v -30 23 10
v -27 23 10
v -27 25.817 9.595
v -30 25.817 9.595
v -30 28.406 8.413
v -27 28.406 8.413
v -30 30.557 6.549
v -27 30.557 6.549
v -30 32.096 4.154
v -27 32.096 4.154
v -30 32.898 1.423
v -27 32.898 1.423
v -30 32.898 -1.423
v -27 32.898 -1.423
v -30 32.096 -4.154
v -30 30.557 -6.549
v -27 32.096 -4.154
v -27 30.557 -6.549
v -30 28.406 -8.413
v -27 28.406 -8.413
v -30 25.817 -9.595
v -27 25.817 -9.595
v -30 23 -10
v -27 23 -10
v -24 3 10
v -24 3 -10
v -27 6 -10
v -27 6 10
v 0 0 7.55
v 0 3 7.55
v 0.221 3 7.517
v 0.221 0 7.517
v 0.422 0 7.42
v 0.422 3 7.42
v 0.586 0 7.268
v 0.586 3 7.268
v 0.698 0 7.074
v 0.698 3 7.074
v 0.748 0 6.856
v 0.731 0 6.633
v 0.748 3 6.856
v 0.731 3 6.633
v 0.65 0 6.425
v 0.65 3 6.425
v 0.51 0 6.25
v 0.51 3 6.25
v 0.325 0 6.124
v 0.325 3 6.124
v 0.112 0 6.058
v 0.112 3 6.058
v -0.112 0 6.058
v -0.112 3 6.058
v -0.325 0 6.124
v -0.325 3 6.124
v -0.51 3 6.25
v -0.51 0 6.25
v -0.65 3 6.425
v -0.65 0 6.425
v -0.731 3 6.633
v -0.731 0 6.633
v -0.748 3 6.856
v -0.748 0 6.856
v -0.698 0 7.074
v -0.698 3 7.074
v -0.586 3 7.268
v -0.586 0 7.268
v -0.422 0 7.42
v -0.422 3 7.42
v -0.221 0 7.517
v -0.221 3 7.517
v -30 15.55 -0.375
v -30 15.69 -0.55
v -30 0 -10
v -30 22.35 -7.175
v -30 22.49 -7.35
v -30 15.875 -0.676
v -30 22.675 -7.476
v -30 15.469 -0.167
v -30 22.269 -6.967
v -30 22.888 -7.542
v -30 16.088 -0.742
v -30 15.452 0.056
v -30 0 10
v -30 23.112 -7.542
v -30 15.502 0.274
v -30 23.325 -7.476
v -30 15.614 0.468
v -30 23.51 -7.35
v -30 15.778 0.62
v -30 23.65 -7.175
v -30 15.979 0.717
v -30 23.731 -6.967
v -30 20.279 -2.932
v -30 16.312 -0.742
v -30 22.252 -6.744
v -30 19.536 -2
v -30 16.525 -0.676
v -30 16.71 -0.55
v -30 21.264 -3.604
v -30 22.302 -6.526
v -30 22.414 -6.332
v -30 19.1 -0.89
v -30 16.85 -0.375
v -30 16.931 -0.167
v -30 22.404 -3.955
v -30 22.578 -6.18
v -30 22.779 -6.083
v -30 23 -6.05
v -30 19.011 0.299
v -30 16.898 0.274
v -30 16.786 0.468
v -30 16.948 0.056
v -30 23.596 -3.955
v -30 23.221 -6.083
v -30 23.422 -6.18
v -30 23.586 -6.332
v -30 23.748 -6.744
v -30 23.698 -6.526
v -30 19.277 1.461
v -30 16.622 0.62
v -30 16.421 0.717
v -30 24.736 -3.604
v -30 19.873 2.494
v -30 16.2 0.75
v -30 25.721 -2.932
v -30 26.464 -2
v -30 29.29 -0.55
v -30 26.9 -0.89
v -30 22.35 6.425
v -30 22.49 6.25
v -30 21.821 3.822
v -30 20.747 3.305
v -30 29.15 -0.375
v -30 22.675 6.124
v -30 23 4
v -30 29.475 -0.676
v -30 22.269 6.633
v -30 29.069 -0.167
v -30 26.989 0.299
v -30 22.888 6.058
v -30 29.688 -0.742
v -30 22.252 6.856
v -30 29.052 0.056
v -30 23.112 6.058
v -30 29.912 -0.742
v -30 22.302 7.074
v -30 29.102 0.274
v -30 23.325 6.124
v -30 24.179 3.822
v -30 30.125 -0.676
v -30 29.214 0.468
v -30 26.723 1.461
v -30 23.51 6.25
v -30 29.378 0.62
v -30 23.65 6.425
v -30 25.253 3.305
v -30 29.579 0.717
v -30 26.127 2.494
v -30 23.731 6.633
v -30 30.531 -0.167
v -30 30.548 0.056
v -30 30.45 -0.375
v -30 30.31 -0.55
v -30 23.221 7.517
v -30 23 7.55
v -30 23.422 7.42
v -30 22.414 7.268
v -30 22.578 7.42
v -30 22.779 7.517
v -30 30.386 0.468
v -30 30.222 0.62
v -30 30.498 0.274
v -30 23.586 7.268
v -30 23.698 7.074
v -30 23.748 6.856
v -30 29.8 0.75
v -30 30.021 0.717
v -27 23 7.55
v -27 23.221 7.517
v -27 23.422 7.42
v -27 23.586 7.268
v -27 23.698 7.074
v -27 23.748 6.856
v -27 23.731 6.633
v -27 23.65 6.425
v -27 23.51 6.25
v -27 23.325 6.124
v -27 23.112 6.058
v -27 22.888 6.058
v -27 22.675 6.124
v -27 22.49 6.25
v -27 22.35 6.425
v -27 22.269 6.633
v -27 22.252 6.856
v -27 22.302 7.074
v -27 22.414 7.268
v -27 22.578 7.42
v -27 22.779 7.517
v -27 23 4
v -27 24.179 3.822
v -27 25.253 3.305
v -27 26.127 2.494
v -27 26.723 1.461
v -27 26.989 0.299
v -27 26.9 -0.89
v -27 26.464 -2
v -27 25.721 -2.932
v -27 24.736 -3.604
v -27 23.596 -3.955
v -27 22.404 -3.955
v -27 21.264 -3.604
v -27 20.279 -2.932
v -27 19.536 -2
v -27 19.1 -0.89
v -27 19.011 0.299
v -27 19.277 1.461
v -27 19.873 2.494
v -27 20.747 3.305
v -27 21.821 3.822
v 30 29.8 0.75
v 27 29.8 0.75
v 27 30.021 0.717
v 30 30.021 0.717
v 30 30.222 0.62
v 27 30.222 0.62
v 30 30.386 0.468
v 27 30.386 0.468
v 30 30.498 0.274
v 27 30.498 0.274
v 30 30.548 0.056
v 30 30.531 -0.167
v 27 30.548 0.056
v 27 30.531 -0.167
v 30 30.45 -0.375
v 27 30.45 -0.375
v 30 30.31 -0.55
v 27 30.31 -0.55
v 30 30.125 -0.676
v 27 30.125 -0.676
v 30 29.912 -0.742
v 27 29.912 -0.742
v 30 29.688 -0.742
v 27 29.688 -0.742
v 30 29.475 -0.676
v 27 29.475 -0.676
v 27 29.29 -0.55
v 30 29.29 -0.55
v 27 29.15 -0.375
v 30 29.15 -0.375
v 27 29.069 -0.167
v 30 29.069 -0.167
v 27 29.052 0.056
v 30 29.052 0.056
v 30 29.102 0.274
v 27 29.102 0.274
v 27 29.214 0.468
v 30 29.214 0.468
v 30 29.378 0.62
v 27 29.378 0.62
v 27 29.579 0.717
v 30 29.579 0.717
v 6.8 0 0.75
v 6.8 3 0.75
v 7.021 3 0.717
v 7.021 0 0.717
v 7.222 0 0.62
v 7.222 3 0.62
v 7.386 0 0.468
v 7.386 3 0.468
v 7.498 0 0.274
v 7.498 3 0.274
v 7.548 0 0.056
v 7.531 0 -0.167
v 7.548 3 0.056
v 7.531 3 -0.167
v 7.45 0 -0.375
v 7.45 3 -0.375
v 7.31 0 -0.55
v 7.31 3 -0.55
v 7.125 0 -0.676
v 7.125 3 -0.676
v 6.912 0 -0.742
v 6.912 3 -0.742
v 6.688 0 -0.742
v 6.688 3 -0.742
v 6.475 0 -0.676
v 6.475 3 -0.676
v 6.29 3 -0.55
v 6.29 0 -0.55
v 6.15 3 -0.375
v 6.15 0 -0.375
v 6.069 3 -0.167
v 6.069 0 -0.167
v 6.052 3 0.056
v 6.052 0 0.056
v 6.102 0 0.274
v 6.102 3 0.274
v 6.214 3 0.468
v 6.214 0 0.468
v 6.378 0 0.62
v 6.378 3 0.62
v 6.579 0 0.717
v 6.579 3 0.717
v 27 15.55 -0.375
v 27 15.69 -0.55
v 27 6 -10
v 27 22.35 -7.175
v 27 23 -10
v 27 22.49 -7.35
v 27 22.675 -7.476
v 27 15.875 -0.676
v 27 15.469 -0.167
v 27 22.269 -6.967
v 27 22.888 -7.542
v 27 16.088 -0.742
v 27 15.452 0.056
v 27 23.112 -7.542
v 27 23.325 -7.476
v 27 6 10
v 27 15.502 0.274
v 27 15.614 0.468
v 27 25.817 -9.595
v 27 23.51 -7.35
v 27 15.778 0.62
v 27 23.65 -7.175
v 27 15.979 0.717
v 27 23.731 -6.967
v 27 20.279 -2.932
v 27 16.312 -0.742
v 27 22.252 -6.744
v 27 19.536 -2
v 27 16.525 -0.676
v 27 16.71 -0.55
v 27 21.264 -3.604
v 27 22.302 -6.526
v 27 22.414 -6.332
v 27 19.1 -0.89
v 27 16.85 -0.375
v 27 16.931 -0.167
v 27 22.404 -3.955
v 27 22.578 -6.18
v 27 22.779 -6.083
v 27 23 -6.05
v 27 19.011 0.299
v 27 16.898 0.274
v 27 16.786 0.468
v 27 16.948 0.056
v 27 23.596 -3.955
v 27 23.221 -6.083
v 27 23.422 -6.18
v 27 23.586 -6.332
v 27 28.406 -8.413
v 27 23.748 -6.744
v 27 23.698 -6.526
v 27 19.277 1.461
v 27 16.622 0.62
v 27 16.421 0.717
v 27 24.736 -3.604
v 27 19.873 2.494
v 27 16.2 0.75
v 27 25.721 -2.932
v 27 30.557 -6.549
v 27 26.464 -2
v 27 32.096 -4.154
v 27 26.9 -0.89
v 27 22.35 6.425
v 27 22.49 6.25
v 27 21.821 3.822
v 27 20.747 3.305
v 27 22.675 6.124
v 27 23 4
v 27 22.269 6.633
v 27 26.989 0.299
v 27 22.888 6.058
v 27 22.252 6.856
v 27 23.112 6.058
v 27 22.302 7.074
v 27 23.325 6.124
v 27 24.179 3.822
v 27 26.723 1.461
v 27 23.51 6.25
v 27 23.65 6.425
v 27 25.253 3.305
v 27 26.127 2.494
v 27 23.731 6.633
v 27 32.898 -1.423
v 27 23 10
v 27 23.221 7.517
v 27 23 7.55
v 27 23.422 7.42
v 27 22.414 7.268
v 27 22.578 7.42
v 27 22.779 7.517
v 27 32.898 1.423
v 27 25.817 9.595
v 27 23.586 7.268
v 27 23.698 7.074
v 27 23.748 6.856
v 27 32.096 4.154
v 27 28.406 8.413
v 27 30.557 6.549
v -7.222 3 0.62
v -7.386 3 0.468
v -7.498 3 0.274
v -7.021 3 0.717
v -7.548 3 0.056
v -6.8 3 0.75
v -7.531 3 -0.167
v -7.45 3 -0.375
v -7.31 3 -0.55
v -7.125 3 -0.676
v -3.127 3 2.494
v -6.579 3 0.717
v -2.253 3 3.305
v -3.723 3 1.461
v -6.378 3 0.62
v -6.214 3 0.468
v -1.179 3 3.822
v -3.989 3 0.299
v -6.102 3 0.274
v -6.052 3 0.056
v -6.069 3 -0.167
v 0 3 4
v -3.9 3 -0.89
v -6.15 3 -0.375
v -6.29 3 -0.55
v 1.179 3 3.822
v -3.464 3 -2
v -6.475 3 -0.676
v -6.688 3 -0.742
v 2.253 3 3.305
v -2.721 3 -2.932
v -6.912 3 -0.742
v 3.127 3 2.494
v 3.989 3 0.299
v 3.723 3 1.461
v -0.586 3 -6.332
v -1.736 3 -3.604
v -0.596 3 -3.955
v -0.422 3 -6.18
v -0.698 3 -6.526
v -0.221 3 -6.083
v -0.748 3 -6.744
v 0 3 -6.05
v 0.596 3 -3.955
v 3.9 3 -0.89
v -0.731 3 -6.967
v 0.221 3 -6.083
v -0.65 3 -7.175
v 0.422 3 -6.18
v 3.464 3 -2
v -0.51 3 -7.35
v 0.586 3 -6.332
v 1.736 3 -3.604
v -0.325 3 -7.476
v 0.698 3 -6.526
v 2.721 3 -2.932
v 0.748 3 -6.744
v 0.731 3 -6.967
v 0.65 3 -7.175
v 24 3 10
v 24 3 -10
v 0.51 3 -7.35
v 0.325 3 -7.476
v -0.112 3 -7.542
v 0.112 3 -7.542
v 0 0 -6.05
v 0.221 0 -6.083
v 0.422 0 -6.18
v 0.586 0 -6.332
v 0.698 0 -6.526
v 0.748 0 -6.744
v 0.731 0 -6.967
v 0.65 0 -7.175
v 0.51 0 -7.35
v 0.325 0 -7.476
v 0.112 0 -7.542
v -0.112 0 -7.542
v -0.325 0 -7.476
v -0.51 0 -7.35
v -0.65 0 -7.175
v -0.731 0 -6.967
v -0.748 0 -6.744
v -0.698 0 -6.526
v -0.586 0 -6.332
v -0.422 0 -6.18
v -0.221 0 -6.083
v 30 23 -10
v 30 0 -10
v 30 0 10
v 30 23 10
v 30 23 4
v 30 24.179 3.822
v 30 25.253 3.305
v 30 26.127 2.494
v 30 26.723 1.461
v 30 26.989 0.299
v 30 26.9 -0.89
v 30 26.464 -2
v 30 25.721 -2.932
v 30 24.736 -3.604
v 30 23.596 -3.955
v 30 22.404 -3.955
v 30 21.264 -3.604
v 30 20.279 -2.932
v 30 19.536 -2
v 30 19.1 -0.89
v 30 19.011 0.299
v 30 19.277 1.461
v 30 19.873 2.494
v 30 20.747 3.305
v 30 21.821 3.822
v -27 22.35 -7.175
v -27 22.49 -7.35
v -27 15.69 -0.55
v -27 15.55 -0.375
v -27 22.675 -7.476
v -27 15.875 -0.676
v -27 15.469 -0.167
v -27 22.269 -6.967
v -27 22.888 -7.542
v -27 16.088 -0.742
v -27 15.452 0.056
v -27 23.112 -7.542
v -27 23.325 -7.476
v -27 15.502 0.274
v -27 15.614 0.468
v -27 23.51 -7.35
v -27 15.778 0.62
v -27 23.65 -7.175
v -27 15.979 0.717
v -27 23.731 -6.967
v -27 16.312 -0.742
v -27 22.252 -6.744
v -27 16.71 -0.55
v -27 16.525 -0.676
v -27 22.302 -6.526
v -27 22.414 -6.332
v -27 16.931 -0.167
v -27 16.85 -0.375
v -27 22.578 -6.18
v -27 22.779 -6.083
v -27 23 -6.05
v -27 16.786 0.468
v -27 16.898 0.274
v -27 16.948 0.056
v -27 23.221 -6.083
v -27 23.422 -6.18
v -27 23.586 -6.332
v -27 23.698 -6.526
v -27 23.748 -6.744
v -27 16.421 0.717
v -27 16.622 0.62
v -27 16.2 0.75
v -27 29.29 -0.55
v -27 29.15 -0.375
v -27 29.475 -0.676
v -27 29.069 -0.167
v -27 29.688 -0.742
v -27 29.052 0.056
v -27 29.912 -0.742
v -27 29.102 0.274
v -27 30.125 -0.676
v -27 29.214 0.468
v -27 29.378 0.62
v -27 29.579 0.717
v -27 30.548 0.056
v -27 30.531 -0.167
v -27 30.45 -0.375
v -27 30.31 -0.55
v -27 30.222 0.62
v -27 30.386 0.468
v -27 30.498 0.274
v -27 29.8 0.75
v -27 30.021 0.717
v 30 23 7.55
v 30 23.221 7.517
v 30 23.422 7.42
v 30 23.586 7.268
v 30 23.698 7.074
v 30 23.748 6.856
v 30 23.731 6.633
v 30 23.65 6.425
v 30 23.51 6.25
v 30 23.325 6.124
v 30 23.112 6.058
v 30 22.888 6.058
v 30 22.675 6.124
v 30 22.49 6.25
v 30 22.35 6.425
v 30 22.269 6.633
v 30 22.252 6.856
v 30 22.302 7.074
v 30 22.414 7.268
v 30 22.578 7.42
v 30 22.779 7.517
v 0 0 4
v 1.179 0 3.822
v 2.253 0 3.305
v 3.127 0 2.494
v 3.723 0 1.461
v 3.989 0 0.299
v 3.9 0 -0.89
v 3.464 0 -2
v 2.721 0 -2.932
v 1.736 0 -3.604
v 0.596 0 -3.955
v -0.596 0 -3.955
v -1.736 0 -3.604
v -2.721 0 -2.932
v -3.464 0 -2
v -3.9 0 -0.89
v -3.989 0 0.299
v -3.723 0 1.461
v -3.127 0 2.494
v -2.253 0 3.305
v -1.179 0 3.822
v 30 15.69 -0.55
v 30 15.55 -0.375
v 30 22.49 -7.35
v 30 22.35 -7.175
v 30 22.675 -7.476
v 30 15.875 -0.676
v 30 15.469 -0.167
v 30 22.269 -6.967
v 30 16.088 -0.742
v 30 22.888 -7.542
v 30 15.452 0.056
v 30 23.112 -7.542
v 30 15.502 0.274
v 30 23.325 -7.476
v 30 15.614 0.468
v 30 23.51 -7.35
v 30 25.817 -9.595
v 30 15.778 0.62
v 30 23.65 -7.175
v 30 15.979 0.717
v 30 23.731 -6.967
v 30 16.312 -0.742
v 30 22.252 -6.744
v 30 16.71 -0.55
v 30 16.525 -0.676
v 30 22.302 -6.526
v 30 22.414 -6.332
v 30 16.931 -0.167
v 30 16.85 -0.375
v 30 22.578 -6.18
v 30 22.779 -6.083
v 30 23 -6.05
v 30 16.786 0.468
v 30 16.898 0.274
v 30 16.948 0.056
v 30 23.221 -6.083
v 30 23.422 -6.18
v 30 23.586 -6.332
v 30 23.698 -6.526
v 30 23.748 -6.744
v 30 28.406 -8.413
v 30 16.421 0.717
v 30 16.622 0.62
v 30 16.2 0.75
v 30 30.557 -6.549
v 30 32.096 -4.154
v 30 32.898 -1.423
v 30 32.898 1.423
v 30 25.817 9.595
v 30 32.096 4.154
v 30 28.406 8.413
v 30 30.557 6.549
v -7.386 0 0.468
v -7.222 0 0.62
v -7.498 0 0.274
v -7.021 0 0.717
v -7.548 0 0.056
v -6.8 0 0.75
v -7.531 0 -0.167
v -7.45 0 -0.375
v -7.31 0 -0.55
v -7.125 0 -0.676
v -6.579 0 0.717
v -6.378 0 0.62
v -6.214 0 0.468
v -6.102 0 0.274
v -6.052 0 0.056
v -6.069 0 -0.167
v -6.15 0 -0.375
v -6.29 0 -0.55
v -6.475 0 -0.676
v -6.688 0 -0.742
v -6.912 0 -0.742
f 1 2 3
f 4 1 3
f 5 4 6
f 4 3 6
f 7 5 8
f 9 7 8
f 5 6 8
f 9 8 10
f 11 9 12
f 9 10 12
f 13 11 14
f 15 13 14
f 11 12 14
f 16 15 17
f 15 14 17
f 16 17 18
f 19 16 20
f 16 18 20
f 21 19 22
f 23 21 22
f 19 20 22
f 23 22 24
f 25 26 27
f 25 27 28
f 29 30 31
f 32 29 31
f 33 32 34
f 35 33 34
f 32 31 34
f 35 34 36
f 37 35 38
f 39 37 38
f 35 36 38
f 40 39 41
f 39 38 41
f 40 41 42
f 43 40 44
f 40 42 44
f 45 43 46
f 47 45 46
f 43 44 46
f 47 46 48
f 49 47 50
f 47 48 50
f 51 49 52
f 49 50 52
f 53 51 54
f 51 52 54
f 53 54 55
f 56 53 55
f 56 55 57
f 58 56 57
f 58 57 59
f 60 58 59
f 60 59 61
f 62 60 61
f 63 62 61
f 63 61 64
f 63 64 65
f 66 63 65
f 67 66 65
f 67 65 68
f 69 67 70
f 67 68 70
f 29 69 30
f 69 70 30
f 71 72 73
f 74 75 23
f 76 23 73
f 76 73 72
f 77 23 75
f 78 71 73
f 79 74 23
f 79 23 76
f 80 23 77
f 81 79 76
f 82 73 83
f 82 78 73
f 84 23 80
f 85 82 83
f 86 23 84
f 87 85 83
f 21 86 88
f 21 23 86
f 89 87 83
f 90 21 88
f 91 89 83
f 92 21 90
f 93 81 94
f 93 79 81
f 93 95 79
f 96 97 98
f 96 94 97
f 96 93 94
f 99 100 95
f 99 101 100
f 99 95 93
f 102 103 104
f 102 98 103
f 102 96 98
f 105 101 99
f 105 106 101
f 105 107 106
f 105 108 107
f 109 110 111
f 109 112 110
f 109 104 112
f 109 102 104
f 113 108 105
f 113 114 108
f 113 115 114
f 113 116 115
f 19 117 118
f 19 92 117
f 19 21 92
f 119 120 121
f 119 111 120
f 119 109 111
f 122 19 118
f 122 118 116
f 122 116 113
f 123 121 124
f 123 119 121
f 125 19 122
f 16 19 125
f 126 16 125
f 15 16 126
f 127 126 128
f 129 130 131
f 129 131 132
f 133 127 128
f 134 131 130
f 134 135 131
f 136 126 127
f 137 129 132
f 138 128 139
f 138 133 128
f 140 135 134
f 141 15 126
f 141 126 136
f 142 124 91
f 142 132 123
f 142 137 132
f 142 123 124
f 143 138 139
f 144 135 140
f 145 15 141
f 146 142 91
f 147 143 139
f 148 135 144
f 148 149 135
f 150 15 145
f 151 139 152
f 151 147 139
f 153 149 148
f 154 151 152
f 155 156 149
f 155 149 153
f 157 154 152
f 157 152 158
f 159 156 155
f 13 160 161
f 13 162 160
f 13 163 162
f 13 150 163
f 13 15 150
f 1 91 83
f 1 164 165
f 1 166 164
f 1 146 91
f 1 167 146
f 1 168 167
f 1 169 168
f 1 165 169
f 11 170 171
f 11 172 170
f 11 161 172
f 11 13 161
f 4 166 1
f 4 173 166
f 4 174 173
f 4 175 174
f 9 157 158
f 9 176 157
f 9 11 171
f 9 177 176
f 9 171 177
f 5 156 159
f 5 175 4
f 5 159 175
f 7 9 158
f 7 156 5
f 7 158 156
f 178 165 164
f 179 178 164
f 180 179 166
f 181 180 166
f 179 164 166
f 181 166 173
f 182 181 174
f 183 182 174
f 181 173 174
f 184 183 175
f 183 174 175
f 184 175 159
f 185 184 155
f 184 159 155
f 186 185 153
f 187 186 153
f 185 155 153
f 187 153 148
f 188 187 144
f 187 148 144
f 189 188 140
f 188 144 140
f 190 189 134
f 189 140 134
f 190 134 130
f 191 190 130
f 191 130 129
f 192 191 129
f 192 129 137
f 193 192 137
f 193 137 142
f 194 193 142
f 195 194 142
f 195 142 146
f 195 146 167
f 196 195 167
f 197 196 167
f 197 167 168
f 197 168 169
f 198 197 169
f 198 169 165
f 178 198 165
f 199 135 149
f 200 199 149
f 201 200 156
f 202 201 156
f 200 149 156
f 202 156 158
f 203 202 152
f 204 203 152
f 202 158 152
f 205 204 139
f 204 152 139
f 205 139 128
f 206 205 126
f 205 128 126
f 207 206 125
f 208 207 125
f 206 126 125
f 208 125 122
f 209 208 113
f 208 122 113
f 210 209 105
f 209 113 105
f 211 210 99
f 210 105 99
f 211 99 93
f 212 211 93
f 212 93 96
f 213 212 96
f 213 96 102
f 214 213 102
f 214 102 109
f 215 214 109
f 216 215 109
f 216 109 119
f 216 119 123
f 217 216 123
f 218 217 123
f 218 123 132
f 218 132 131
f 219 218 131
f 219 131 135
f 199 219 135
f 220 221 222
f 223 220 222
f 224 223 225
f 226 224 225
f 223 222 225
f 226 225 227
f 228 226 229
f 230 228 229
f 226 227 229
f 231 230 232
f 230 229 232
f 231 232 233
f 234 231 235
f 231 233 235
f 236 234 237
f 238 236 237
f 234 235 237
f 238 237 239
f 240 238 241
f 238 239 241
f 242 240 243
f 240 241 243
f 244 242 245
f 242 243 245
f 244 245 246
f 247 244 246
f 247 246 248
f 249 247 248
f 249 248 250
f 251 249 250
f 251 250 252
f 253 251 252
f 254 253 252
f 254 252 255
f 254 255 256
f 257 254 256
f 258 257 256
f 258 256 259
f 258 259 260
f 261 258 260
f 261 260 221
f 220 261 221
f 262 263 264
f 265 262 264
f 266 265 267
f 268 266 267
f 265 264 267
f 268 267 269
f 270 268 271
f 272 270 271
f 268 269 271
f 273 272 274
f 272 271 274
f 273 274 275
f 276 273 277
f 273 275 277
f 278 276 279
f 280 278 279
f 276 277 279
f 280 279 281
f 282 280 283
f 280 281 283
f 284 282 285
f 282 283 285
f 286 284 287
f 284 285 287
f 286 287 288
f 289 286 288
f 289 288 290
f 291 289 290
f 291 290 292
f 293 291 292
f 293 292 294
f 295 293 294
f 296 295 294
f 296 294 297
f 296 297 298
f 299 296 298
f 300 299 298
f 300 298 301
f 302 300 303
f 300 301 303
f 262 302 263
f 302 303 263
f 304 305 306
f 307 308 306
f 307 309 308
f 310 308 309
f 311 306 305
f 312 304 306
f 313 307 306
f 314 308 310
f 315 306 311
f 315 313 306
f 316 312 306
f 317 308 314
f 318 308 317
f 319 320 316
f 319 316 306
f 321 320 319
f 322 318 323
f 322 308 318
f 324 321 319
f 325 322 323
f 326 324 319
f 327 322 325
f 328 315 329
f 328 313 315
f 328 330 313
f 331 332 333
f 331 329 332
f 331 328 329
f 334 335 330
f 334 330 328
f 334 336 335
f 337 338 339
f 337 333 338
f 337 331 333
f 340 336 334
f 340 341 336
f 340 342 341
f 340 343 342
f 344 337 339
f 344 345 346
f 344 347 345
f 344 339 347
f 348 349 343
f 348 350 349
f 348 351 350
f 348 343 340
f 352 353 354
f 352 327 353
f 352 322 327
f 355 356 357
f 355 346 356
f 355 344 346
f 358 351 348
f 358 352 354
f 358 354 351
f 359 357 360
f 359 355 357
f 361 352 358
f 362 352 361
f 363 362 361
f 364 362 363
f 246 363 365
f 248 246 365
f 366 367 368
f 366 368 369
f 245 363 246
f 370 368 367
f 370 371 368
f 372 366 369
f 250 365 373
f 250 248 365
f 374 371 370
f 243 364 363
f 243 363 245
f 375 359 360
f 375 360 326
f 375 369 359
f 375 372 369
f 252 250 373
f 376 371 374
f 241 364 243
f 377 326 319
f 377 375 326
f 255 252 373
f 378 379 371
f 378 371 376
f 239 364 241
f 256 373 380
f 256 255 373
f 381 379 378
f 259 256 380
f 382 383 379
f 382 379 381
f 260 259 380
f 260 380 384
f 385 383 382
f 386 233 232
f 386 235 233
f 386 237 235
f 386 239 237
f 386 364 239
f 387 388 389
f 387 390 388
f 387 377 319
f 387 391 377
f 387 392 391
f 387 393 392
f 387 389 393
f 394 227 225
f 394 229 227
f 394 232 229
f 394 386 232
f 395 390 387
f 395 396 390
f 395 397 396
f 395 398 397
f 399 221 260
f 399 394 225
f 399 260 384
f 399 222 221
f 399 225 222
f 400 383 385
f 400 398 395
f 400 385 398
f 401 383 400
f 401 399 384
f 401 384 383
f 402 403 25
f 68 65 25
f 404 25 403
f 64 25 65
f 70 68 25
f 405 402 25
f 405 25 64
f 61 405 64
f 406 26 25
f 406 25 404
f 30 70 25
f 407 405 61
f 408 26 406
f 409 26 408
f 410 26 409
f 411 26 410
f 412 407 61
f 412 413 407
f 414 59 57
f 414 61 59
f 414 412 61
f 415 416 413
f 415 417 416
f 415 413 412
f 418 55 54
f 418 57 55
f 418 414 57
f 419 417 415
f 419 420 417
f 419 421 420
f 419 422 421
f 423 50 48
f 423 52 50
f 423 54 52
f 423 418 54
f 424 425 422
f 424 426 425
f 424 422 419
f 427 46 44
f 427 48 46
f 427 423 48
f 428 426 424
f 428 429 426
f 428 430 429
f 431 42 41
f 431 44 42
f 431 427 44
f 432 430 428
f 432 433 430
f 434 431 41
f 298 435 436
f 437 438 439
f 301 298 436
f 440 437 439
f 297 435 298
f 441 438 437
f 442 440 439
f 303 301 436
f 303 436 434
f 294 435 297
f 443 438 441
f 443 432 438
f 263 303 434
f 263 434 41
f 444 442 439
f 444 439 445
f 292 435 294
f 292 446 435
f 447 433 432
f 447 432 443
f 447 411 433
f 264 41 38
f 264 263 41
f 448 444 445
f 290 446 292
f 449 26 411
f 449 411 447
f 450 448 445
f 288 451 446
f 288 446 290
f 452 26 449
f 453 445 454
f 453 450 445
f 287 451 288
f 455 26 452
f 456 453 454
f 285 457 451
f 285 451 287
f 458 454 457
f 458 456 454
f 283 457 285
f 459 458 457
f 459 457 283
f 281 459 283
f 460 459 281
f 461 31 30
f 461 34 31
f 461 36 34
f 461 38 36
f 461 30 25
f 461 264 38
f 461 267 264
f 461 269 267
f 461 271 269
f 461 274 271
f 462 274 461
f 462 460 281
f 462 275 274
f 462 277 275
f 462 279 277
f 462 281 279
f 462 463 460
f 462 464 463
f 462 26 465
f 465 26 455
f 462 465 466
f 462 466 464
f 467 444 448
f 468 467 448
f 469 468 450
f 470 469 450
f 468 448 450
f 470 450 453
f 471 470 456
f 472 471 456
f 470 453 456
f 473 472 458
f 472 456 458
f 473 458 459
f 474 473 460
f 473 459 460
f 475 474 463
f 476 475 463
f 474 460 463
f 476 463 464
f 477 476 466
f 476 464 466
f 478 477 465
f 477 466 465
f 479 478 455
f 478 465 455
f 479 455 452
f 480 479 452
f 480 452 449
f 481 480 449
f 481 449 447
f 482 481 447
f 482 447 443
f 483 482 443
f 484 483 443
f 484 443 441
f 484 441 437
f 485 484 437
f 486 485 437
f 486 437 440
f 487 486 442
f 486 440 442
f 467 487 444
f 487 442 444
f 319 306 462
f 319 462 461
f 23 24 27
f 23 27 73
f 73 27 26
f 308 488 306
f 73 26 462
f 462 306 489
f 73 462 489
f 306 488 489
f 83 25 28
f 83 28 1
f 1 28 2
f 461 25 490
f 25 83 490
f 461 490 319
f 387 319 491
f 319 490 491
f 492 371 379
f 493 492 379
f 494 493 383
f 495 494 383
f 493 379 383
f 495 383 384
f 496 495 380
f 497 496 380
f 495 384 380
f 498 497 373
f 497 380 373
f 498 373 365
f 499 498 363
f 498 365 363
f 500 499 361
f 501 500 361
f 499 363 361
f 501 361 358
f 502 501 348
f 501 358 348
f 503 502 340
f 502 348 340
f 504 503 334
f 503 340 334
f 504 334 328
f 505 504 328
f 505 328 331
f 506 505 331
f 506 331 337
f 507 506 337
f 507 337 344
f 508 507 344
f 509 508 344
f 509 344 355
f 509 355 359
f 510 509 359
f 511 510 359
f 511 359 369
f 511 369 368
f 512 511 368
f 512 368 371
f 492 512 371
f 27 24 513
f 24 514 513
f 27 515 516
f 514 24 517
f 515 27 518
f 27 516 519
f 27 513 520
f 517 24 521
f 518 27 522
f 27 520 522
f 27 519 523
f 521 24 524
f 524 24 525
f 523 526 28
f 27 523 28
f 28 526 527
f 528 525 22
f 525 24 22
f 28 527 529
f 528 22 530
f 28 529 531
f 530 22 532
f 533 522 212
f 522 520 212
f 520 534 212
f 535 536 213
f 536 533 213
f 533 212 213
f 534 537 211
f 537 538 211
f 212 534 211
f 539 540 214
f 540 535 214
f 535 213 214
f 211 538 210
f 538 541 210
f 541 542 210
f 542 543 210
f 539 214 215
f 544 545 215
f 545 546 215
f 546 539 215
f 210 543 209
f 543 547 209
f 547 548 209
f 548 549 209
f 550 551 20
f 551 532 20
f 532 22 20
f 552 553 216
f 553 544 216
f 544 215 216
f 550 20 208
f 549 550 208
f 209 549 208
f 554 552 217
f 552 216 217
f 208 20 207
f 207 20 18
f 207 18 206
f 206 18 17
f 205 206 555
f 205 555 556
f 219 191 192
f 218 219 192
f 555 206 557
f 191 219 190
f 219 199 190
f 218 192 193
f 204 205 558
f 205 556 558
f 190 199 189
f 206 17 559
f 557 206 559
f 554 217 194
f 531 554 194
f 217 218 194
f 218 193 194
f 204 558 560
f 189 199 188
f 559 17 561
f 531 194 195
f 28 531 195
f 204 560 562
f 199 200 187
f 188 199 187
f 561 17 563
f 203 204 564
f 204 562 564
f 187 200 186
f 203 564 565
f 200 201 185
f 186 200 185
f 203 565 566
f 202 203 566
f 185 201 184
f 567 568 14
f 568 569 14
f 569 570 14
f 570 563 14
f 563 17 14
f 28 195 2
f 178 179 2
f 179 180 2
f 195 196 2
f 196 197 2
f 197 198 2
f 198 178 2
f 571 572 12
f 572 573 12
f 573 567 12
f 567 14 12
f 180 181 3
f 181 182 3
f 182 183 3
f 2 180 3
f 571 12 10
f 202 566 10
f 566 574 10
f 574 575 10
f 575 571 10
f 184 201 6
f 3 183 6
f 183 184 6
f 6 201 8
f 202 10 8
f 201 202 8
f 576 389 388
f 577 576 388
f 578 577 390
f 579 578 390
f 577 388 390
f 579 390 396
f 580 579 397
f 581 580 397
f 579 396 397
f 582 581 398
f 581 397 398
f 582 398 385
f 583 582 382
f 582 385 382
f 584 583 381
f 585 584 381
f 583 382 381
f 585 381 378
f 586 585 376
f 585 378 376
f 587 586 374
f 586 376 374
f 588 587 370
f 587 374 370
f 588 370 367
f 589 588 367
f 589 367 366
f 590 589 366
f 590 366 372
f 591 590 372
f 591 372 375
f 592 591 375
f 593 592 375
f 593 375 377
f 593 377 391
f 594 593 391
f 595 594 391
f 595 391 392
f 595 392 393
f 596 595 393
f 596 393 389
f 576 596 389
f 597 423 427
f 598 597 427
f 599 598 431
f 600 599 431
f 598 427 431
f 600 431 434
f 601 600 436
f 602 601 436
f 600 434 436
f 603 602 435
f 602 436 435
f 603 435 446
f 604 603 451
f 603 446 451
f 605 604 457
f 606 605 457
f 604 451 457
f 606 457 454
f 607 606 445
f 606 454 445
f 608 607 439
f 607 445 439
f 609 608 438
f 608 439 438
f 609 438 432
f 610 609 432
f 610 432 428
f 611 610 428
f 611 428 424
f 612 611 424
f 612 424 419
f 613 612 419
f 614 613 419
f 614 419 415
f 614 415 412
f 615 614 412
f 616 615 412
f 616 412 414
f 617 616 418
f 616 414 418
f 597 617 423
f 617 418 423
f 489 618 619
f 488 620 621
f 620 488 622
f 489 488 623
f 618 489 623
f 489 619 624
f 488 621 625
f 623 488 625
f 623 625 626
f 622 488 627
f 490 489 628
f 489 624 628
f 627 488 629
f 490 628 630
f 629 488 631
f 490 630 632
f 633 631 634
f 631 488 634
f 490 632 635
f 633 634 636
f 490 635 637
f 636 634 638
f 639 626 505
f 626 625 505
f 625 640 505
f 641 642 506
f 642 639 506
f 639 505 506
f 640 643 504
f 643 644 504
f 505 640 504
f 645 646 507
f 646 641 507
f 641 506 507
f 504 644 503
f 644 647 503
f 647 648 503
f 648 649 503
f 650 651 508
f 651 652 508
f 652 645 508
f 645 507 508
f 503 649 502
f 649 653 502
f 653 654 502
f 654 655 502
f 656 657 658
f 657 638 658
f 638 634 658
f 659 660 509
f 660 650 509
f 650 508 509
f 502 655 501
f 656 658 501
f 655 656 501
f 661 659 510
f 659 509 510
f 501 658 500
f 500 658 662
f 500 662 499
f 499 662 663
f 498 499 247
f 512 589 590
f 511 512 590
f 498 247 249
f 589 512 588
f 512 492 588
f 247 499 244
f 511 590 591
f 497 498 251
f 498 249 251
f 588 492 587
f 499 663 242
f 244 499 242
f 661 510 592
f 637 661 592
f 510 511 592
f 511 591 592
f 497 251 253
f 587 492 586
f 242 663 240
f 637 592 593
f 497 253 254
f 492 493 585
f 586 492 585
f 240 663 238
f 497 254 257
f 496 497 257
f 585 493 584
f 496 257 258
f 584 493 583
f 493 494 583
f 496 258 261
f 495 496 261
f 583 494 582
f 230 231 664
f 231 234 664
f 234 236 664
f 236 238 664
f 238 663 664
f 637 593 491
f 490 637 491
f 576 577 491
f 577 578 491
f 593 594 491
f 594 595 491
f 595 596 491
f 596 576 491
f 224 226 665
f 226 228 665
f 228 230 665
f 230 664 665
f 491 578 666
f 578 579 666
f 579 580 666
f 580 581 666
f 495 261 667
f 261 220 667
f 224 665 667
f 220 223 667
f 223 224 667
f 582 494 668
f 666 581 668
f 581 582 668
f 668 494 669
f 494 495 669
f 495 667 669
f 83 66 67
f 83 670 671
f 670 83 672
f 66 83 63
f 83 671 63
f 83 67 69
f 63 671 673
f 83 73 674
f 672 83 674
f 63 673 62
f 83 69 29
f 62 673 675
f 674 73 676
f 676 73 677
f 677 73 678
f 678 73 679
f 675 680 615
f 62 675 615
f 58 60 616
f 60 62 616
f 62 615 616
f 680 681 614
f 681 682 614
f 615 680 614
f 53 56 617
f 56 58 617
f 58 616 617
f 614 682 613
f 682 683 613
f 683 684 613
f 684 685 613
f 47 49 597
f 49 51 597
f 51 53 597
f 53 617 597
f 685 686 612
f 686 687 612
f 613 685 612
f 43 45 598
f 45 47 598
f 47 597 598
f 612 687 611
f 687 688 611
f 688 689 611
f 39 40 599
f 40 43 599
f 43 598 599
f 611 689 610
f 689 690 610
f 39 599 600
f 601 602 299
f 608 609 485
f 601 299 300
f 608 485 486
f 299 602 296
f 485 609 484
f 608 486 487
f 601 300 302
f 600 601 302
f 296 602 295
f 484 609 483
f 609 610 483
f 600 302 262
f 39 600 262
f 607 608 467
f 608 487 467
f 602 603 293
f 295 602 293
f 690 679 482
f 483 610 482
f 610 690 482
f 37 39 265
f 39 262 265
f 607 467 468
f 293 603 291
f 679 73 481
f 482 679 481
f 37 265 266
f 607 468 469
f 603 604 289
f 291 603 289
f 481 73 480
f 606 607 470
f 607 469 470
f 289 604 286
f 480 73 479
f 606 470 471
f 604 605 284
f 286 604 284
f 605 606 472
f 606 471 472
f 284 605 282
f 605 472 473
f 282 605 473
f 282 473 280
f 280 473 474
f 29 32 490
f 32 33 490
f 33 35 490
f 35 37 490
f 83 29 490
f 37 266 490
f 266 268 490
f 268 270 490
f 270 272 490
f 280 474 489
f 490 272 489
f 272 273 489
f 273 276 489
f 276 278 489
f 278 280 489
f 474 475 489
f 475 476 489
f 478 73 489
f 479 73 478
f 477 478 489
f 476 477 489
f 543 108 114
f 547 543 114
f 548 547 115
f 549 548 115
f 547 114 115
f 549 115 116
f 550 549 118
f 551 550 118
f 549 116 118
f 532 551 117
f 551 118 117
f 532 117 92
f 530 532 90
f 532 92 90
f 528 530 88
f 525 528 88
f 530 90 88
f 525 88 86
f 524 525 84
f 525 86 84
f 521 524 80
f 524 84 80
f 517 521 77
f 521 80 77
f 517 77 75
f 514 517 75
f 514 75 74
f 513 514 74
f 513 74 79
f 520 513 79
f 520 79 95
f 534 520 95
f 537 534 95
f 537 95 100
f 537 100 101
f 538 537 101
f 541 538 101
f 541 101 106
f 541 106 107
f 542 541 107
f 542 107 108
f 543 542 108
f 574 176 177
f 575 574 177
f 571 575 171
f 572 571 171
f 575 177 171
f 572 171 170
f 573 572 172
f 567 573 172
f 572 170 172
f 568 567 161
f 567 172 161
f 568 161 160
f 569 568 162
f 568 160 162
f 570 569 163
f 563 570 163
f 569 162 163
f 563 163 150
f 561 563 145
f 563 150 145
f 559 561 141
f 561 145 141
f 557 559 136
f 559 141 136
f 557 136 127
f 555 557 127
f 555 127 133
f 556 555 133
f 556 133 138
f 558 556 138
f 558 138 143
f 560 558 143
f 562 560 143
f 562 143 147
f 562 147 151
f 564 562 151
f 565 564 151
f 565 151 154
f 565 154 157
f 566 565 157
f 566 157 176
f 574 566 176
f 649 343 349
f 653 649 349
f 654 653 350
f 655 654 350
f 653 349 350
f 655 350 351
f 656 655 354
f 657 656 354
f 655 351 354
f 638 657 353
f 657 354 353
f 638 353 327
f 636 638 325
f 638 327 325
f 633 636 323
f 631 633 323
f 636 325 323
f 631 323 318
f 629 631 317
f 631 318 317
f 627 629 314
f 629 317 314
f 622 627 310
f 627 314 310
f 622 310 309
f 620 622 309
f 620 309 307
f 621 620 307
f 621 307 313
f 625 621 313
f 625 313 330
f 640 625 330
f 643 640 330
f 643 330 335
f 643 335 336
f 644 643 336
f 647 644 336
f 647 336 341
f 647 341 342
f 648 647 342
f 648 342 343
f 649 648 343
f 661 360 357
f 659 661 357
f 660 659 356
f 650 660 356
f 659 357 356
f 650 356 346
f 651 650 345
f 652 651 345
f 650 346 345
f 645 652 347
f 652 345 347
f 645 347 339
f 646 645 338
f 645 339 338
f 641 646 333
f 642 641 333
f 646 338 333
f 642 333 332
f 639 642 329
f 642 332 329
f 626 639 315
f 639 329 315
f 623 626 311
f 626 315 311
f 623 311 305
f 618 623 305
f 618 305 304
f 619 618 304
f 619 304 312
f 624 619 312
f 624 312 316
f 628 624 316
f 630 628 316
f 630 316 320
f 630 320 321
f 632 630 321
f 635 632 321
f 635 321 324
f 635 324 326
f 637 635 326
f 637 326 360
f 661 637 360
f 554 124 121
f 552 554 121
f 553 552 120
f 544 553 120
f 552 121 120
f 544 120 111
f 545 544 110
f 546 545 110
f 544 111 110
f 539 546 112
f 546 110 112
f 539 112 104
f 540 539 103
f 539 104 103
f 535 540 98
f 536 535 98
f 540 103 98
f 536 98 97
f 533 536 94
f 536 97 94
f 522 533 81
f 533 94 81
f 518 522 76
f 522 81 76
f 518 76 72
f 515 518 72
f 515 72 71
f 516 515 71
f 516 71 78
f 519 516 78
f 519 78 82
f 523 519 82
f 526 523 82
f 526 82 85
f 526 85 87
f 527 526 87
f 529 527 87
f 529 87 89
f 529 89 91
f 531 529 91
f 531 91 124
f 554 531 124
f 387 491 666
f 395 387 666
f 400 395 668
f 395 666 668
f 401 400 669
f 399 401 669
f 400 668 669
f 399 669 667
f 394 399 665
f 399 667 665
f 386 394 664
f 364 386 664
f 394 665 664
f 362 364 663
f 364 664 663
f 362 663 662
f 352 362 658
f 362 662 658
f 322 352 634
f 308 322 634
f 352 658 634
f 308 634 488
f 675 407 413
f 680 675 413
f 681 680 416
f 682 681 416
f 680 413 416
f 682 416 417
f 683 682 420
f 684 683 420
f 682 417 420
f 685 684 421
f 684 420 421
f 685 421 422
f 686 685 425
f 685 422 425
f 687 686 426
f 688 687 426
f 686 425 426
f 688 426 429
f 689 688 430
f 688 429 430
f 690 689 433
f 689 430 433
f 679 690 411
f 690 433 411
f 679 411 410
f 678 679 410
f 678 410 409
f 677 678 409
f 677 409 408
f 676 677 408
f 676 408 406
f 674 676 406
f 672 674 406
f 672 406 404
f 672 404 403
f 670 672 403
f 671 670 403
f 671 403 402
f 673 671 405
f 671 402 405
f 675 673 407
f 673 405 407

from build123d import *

# Parameters (mm, degrees)
SKETCH_1_W          = 60
SKETCH_1_H          = 20
EXTRUDE_1_DEPTH     = 3
EXTRUDE_2_DEPTH     = 3
EXTRUDE_START       = -3
EXTRUDE_3_DEPTH     = 3
SKETCH_4_R          = 4
SKETCH_4_R_2        = 0.75
CUT_EXTRUDE_1_DEPTH = 70.202601107
SKETCH_5_R          = 4
SKETCH_5_R_2        = 0.75
CUT_EXTRUDE_2_DEPTH = 3
CHAMFER_1_SIZE      = 3


with BuildPart() as part:
    # 草图1 → 凸台-拉伸1 (new body)
    with BuildSketch(Plane(origin=(0, 0, 0), x_dir=(1, 0, 0), z_dir=(0, 1, 0))):
        Rectangle(SKETCH_1_W, SKETCH_1_H)
    extrude(amount=EXTRUDE_1_DEPTH)

    # 草图2 → 凸台-拉伸2 (add)
    with BuildSketch(Plane(origin=(30, 0, 0), x_dir=(0, 0, -1), z_dir=(1, 0, 0))):
        with BuildLine():
            Line((-10, 3), (-10, 23))
            ThreePointArc((-10, 23), (0, 33), (10, 23))
            Line((10, 23), (10, 3))
            Line((10, 3), (-10, 3))
        make_face()
    extrude(amount=-EXTRUDE_2_DEPTH)

    # 草图3 → 凸台-拉伸3 (add)
    with BuildSketch(Plane.ZY.offset(30).offset(EXTRUDE_START)):
        with BuildLine():
            Line((-10, 3), (10, 3))
            Line((10, 3), (10, 23))
            ThreePointArc((10, 23), (0, 33), (-10, 23))
            Line((-10, 23), (-10, 3))
        make_face()
    extrude(amount=EXTRUDE_3_DEPTH)

    # 草图4 → 切除-拉伸1 (cut, through all)
    with BuildSketch(Plane.ZY.offset(30)):
        with Locations((0, 23)):
            Circle(SKETCH_4_R)
        with Locations((0, 29.8)):
            Circle(SKETCH_4_R_2)
        with Locations((6.8, 23)):
            Circle(SKETCH_4_R_2)
        with Locations((0, 16.2)):
            Circle(SKETCH_4_R_2)
        with Locations((-6.8, 23)):
            Circle(SKETCH_4_R_2)
    extrude(amount=-CUT_EXTRUDE_1_DEPTH, mode=Mode.SUBTRACT)

    # 草图5 → 切除-拉伸2 (cut)
    with BuildSketch(Plane(origin=(0, 3, 0), x_dir=(1, 0, 0), z_dir=(0, 1, 0))):
        with Locations(Location((0, 0, 0), (0, 0, 270))):
            Circle(SKETCH_5_R)
        with Locations(Location((0, 6.8, 0), (0, 0, 270))):
            Circle(SKETCH_5_R_2)
        with Locations(Location((6.8, 0, 0), (0, 0, 270))):
            Circle(SKETCH_5_R_2)
        with Locations(Location((0, -6.8, 0), (0, 0, 270))):
            Circle(SKETCH_5_R_2)
        with Locations(Location((-6.8, 0, 0), (0, 0, 270))):
            Circle(SKETCH_5_R_2)
    extrude(amount=-CUT_EXTRUDE_2_DEPTH, mode=Mode.SUBTRACT)

    # 倒角1
    chamfer_1_edges = [part.edges().sort_by_distance(p)[0] for p in [
        (27, 3, 0),
        (-27, 3, 0),
    ]]
    chamfer(chamfer_1_edges, length=CHAMFER_1_SIZE)


solid = part.part
